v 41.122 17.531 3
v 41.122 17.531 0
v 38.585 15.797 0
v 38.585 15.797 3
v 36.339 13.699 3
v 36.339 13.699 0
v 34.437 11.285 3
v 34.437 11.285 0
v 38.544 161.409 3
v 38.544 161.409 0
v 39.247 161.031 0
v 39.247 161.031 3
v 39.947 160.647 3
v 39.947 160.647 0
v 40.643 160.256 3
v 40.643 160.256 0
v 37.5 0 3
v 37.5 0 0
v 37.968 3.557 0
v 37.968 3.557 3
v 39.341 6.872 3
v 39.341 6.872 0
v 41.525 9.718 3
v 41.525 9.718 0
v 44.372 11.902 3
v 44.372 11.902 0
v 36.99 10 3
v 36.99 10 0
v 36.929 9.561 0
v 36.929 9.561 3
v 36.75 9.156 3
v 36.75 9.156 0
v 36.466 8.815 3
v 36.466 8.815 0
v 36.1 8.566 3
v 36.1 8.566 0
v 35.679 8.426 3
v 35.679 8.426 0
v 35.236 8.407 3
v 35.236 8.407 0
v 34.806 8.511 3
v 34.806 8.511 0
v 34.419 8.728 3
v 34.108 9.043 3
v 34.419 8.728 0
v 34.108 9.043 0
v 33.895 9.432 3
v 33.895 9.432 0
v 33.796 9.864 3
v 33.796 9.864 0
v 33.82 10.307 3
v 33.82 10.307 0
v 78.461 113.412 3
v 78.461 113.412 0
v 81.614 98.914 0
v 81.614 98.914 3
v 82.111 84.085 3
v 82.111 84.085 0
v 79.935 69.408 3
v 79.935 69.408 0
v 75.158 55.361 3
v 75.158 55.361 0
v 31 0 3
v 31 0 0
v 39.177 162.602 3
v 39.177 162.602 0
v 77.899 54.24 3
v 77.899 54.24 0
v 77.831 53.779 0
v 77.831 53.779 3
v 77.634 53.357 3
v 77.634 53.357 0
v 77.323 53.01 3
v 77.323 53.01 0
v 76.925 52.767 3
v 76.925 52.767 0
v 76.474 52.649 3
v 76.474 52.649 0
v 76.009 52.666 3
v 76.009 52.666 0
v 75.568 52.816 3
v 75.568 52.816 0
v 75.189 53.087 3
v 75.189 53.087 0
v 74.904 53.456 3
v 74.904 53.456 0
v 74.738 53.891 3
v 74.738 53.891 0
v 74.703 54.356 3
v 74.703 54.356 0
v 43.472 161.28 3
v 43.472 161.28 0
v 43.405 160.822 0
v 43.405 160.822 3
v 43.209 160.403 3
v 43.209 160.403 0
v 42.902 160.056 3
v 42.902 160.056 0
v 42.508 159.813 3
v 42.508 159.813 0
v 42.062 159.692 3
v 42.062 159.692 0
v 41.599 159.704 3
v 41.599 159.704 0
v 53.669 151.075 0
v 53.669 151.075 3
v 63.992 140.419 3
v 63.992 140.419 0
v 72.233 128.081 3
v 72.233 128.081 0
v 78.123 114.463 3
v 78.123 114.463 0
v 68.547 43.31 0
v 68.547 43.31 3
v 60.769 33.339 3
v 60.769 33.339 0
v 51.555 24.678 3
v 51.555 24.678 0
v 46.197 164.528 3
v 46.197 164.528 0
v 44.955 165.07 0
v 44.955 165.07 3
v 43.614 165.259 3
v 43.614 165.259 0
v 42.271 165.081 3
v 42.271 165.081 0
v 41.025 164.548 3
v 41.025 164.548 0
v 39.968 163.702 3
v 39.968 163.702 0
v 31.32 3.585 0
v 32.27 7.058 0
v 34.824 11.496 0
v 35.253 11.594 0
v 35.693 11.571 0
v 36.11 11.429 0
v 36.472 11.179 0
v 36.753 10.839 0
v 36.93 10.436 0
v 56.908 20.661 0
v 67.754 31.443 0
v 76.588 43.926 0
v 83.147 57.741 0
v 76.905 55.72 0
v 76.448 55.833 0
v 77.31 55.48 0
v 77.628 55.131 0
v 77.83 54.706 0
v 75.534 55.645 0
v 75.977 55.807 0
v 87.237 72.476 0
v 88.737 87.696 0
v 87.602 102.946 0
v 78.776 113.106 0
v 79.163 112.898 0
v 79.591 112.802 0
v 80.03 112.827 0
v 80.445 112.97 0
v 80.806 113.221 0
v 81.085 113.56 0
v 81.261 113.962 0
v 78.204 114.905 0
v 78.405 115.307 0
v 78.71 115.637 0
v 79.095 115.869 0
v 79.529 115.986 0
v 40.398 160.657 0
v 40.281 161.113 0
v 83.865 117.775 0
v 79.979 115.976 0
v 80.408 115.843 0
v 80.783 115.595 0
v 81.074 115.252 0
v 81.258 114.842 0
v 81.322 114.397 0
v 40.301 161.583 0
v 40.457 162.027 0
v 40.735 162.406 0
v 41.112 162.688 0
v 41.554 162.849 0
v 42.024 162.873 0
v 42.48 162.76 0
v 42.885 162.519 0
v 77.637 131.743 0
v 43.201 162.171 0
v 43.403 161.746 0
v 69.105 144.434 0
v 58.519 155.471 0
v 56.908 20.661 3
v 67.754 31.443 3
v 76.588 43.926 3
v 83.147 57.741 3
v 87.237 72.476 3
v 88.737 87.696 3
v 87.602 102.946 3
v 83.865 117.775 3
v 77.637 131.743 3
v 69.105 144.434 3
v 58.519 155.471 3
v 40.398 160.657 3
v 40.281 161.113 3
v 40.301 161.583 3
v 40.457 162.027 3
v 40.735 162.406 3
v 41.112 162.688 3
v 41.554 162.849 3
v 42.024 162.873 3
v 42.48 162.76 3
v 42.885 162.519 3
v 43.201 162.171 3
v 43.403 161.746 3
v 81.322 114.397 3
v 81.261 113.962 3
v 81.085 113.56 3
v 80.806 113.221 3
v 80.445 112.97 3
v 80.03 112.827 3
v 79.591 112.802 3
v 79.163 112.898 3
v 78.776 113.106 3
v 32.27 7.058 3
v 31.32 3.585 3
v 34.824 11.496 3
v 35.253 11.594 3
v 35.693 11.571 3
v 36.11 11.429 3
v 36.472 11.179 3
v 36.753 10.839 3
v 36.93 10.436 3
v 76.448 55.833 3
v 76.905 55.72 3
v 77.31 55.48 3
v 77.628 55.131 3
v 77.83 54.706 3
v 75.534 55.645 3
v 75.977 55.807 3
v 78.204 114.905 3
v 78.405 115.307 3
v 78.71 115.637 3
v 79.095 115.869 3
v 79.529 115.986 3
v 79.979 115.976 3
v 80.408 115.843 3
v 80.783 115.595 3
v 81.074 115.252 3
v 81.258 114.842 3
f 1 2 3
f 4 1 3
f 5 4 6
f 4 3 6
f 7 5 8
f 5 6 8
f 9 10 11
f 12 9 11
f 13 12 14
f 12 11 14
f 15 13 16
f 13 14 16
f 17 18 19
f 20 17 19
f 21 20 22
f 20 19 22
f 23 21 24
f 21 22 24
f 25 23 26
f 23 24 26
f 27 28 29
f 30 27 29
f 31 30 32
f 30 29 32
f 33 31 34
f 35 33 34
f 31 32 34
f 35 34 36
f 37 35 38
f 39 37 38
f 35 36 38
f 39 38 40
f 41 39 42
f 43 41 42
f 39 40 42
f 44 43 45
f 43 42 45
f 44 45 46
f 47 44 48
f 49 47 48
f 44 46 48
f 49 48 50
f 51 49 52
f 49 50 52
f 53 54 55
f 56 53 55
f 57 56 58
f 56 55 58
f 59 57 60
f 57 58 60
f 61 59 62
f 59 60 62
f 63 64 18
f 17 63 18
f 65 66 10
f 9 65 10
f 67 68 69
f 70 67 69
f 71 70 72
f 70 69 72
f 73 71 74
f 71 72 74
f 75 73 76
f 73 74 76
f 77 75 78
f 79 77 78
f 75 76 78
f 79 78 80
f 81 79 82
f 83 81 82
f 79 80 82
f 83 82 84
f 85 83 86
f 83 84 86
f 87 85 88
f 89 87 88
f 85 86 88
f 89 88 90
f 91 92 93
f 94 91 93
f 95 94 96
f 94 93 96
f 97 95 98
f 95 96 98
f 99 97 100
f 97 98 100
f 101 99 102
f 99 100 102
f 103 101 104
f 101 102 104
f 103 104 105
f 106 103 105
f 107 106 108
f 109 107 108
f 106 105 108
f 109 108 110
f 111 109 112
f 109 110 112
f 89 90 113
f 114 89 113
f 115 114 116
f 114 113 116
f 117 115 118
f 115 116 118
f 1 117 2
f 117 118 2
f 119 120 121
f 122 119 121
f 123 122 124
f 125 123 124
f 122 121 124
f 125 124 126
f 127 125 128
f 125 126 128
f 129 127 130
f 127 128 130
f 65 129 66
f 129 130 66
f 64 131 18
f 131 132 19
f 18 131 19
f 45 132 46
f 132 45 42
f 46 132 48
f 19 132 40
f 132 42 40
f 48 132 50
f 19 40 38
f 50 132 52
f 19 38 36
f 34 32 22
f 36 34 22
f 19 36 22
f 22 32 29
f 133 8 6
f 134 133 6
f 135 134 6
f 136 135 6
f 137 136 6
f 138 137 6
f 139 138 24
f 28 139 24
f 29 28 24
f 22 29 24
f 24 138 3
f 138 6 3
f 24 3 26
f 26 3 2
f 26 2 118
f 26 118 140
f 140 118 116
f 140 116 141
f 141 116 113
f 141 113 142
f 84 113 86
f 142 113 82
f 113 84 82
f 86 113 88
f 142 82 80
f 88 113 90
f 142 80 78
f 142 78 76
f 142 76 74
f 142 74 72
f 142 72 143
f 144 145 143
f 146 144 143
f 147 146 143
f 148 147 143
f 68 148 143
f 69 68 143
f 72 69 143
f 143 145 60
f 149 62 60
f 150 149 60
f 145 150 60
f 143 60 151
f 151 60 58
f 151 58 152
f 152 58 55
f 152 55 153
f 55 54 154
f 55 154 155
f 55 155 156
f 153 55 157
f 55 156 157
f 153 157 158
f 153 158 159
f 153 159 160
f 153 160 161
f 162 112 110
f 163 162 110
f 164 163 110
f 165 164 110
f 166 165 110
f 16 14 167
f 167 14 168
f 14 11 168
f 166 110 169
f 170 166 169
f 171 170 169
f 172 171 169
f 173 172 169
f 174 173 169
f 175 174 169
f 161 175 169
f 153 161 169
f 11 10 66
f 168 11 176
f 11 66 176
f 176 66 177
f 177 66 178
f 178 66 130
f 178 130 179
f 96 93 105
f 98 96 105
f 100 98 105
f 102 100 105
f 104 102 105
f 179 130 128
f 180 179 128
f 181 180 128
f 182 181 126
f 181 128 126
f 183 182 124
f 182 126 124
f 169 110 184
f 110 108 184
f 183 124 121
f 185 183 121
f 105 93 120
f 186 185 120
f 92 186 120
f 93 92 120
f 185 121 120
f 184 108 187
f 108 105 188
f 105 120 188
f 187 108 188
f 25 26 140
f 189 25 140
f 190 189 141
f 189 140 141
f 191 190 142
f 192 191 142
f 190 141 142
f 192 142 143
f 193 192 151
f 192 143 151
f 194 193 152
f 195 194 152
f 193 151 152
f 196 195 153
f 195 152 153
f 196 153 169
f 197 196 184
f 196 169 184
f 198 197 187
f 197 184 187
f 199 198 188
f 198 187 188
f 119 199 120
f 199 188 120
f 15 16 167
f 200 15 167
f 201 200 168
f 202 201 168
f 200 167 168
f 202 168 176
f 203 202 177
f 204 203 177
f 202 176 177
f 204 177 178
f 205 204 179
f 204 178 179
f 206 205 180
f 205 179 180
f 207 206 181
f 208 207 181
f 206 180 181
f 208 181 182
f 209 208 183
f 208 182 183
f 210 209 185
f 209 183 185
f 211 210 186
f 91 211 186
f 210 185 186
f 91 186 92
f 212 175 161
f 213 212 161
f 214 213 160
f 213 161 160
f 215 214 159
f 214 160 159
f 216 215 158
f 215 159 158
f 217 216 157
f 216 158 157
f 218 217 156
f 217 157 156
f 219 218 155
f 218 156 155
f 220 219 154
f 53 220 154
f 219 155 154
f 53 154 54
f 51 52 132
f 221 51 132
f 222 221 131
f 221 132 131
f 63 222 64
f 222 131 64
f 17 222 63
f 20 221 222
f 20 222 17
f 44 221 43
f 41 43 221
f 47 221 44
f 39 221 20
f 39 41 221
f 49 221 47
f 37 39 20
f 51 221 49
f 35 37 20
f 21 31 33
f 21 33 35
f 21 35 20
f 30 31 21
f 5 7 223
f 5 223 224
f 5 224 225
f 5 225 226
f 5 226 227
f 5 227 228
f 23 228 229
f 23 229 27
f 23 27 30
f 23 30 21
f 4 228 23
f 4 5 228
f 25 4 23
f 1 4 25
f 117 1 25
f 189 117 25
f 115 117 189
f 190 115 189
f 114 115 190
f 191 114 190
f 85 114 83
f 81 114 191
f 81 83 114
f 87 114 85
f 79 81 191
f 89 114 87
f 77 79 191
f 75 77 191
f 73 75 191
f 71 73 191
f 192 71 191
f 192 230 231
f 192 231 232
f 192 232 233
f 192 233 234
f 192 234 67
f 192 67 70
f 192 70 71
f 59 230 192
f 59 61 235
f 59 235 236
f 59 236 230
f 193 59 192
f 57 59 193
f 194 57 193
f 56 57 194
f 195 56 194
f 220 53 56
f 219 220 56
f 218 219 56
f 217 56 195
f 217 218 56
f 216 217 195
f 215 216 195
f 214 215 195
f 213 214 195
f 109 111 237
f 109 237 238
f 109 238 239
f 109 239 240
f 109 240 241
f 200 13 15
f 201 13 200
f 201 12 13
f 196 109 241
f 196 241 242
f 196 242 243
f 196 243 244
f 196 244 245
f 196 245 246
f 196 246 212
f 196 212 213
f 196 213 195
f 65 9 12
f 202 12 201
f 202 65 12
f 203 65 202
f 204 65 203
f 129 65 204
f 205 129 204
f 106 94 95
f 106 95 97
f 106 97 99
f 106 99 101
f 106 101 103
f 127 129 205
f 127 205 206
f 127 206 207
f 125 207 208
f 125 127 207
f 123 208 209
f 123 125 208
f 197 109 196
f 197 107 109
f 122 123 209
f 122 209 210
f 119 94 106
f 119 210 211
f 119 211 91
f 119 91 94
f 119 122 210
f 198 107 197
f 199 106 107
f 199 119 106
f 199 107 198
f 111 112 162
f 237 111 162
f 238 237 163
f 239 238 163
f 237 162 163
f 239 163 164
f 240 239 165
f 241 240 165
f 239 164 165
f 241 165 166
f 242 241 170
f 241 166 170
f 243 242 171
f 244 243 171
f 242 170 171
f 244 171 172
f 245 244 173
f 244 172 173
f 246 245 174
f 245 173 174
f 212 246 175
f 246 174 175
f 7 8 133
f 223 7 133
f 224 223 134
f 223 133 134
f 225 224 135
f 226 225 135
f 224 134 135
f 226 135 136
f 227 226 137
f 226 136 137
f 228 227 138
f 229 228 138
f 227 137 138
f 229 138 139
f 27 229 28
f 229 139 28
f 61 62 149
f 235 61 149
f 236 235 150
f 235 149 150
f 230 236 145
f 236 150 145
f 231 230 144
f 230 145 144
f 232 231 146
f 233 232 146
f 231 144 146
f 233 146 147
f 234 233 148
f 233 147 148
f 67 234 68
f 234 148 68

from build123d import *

# Parameters (mm, degrees)
BOSS_EXTRUDE1_DEPTH = 3


with BuildPart() as part:
    # Sketch1 → Boss-Extrude1 (new body)
    with BuildSketch(Plane.XY):
        with BuildLine():
            ThreePointArc((33.820087007, 10.306516907), (31.717745776, 5.342686157), (31, 0))
            Line((31, 0), (37.5, 0))
            ThreePointArc((37.5, 0), (39.341287437, 6.871778265), (44.371778265, 11.902269093))
            ThreePointArc((44.371778265, 11.902269093), (88.737214743, 87.695526288), (46.196526291, 164.52780867))
            ThreePointArc((46.196526291, 164.52780867), (42.270857001, 165.080519331), (39.176809364, 162.60196377))
            Line((39.176809364, 162.60196377), (38.543843383, 161.408867573))
            ThreePointArc((38.543843383, 161.408867573), (39.597624954, 160.839941503), (40.643010869, 160.255731986))
            ThreePointArc((40.643010869, 160.255731986), (41.32681397, 162.784822546), (43.471778265, 161.280490828))
            ThreePointArc((43.471778265, 161.280490828), (42.902085601, 160.056372046), (41.598694773, 159.703967626))
            ThreePointArc((41.598694773, 159.703967626), (63.992298043, 140.41869644), (78.122959048, 114.462587877))
            ThreePointArc((78.122959048, 114.462587877), (79.754340696, 115.996827193), (81.321620809, 114.397161787))
            ThreePointArc((81.321620809, 114.397161787), (80.242557038, 112.884341426), (78.460839002, 113.41205812))
            ThreePointArc((78.460839002, 113.41205812), (82.110783268, 84.085055904), (75.158253764, 55.361241991))
            ThreePointArc((75.158253764, 55.361241991), (76.905197137, 55.720291583), (77.899174561, 54.239502389))
            ThreePointArc((77.899174561, 54.239502389), (76.240981534, 52.640560998), (74.703407596, 54.355811439))
            ThreePointArc((74.703407596, 54.355811439), (60.769047297, 33.338707308), (41.121778265, 17.531434218))
            ThreePointArc((41.121778265, 17.531434218), (37.422133199, 14.790870093), (34.437437632, 11.285209284))
            ThreePointArc((34.437437632, 11.285209284), (36.109888407, 11.429129733), (36.990452374, 10))
            ThreePointArc((36.990452374, 10), (35.236479303, 8.407425891), (33.820087007, 10.306516907))
        make_face()
    extrude(amount=BOSS_EXTRUDE1_DEPTH)


solid = part.part
